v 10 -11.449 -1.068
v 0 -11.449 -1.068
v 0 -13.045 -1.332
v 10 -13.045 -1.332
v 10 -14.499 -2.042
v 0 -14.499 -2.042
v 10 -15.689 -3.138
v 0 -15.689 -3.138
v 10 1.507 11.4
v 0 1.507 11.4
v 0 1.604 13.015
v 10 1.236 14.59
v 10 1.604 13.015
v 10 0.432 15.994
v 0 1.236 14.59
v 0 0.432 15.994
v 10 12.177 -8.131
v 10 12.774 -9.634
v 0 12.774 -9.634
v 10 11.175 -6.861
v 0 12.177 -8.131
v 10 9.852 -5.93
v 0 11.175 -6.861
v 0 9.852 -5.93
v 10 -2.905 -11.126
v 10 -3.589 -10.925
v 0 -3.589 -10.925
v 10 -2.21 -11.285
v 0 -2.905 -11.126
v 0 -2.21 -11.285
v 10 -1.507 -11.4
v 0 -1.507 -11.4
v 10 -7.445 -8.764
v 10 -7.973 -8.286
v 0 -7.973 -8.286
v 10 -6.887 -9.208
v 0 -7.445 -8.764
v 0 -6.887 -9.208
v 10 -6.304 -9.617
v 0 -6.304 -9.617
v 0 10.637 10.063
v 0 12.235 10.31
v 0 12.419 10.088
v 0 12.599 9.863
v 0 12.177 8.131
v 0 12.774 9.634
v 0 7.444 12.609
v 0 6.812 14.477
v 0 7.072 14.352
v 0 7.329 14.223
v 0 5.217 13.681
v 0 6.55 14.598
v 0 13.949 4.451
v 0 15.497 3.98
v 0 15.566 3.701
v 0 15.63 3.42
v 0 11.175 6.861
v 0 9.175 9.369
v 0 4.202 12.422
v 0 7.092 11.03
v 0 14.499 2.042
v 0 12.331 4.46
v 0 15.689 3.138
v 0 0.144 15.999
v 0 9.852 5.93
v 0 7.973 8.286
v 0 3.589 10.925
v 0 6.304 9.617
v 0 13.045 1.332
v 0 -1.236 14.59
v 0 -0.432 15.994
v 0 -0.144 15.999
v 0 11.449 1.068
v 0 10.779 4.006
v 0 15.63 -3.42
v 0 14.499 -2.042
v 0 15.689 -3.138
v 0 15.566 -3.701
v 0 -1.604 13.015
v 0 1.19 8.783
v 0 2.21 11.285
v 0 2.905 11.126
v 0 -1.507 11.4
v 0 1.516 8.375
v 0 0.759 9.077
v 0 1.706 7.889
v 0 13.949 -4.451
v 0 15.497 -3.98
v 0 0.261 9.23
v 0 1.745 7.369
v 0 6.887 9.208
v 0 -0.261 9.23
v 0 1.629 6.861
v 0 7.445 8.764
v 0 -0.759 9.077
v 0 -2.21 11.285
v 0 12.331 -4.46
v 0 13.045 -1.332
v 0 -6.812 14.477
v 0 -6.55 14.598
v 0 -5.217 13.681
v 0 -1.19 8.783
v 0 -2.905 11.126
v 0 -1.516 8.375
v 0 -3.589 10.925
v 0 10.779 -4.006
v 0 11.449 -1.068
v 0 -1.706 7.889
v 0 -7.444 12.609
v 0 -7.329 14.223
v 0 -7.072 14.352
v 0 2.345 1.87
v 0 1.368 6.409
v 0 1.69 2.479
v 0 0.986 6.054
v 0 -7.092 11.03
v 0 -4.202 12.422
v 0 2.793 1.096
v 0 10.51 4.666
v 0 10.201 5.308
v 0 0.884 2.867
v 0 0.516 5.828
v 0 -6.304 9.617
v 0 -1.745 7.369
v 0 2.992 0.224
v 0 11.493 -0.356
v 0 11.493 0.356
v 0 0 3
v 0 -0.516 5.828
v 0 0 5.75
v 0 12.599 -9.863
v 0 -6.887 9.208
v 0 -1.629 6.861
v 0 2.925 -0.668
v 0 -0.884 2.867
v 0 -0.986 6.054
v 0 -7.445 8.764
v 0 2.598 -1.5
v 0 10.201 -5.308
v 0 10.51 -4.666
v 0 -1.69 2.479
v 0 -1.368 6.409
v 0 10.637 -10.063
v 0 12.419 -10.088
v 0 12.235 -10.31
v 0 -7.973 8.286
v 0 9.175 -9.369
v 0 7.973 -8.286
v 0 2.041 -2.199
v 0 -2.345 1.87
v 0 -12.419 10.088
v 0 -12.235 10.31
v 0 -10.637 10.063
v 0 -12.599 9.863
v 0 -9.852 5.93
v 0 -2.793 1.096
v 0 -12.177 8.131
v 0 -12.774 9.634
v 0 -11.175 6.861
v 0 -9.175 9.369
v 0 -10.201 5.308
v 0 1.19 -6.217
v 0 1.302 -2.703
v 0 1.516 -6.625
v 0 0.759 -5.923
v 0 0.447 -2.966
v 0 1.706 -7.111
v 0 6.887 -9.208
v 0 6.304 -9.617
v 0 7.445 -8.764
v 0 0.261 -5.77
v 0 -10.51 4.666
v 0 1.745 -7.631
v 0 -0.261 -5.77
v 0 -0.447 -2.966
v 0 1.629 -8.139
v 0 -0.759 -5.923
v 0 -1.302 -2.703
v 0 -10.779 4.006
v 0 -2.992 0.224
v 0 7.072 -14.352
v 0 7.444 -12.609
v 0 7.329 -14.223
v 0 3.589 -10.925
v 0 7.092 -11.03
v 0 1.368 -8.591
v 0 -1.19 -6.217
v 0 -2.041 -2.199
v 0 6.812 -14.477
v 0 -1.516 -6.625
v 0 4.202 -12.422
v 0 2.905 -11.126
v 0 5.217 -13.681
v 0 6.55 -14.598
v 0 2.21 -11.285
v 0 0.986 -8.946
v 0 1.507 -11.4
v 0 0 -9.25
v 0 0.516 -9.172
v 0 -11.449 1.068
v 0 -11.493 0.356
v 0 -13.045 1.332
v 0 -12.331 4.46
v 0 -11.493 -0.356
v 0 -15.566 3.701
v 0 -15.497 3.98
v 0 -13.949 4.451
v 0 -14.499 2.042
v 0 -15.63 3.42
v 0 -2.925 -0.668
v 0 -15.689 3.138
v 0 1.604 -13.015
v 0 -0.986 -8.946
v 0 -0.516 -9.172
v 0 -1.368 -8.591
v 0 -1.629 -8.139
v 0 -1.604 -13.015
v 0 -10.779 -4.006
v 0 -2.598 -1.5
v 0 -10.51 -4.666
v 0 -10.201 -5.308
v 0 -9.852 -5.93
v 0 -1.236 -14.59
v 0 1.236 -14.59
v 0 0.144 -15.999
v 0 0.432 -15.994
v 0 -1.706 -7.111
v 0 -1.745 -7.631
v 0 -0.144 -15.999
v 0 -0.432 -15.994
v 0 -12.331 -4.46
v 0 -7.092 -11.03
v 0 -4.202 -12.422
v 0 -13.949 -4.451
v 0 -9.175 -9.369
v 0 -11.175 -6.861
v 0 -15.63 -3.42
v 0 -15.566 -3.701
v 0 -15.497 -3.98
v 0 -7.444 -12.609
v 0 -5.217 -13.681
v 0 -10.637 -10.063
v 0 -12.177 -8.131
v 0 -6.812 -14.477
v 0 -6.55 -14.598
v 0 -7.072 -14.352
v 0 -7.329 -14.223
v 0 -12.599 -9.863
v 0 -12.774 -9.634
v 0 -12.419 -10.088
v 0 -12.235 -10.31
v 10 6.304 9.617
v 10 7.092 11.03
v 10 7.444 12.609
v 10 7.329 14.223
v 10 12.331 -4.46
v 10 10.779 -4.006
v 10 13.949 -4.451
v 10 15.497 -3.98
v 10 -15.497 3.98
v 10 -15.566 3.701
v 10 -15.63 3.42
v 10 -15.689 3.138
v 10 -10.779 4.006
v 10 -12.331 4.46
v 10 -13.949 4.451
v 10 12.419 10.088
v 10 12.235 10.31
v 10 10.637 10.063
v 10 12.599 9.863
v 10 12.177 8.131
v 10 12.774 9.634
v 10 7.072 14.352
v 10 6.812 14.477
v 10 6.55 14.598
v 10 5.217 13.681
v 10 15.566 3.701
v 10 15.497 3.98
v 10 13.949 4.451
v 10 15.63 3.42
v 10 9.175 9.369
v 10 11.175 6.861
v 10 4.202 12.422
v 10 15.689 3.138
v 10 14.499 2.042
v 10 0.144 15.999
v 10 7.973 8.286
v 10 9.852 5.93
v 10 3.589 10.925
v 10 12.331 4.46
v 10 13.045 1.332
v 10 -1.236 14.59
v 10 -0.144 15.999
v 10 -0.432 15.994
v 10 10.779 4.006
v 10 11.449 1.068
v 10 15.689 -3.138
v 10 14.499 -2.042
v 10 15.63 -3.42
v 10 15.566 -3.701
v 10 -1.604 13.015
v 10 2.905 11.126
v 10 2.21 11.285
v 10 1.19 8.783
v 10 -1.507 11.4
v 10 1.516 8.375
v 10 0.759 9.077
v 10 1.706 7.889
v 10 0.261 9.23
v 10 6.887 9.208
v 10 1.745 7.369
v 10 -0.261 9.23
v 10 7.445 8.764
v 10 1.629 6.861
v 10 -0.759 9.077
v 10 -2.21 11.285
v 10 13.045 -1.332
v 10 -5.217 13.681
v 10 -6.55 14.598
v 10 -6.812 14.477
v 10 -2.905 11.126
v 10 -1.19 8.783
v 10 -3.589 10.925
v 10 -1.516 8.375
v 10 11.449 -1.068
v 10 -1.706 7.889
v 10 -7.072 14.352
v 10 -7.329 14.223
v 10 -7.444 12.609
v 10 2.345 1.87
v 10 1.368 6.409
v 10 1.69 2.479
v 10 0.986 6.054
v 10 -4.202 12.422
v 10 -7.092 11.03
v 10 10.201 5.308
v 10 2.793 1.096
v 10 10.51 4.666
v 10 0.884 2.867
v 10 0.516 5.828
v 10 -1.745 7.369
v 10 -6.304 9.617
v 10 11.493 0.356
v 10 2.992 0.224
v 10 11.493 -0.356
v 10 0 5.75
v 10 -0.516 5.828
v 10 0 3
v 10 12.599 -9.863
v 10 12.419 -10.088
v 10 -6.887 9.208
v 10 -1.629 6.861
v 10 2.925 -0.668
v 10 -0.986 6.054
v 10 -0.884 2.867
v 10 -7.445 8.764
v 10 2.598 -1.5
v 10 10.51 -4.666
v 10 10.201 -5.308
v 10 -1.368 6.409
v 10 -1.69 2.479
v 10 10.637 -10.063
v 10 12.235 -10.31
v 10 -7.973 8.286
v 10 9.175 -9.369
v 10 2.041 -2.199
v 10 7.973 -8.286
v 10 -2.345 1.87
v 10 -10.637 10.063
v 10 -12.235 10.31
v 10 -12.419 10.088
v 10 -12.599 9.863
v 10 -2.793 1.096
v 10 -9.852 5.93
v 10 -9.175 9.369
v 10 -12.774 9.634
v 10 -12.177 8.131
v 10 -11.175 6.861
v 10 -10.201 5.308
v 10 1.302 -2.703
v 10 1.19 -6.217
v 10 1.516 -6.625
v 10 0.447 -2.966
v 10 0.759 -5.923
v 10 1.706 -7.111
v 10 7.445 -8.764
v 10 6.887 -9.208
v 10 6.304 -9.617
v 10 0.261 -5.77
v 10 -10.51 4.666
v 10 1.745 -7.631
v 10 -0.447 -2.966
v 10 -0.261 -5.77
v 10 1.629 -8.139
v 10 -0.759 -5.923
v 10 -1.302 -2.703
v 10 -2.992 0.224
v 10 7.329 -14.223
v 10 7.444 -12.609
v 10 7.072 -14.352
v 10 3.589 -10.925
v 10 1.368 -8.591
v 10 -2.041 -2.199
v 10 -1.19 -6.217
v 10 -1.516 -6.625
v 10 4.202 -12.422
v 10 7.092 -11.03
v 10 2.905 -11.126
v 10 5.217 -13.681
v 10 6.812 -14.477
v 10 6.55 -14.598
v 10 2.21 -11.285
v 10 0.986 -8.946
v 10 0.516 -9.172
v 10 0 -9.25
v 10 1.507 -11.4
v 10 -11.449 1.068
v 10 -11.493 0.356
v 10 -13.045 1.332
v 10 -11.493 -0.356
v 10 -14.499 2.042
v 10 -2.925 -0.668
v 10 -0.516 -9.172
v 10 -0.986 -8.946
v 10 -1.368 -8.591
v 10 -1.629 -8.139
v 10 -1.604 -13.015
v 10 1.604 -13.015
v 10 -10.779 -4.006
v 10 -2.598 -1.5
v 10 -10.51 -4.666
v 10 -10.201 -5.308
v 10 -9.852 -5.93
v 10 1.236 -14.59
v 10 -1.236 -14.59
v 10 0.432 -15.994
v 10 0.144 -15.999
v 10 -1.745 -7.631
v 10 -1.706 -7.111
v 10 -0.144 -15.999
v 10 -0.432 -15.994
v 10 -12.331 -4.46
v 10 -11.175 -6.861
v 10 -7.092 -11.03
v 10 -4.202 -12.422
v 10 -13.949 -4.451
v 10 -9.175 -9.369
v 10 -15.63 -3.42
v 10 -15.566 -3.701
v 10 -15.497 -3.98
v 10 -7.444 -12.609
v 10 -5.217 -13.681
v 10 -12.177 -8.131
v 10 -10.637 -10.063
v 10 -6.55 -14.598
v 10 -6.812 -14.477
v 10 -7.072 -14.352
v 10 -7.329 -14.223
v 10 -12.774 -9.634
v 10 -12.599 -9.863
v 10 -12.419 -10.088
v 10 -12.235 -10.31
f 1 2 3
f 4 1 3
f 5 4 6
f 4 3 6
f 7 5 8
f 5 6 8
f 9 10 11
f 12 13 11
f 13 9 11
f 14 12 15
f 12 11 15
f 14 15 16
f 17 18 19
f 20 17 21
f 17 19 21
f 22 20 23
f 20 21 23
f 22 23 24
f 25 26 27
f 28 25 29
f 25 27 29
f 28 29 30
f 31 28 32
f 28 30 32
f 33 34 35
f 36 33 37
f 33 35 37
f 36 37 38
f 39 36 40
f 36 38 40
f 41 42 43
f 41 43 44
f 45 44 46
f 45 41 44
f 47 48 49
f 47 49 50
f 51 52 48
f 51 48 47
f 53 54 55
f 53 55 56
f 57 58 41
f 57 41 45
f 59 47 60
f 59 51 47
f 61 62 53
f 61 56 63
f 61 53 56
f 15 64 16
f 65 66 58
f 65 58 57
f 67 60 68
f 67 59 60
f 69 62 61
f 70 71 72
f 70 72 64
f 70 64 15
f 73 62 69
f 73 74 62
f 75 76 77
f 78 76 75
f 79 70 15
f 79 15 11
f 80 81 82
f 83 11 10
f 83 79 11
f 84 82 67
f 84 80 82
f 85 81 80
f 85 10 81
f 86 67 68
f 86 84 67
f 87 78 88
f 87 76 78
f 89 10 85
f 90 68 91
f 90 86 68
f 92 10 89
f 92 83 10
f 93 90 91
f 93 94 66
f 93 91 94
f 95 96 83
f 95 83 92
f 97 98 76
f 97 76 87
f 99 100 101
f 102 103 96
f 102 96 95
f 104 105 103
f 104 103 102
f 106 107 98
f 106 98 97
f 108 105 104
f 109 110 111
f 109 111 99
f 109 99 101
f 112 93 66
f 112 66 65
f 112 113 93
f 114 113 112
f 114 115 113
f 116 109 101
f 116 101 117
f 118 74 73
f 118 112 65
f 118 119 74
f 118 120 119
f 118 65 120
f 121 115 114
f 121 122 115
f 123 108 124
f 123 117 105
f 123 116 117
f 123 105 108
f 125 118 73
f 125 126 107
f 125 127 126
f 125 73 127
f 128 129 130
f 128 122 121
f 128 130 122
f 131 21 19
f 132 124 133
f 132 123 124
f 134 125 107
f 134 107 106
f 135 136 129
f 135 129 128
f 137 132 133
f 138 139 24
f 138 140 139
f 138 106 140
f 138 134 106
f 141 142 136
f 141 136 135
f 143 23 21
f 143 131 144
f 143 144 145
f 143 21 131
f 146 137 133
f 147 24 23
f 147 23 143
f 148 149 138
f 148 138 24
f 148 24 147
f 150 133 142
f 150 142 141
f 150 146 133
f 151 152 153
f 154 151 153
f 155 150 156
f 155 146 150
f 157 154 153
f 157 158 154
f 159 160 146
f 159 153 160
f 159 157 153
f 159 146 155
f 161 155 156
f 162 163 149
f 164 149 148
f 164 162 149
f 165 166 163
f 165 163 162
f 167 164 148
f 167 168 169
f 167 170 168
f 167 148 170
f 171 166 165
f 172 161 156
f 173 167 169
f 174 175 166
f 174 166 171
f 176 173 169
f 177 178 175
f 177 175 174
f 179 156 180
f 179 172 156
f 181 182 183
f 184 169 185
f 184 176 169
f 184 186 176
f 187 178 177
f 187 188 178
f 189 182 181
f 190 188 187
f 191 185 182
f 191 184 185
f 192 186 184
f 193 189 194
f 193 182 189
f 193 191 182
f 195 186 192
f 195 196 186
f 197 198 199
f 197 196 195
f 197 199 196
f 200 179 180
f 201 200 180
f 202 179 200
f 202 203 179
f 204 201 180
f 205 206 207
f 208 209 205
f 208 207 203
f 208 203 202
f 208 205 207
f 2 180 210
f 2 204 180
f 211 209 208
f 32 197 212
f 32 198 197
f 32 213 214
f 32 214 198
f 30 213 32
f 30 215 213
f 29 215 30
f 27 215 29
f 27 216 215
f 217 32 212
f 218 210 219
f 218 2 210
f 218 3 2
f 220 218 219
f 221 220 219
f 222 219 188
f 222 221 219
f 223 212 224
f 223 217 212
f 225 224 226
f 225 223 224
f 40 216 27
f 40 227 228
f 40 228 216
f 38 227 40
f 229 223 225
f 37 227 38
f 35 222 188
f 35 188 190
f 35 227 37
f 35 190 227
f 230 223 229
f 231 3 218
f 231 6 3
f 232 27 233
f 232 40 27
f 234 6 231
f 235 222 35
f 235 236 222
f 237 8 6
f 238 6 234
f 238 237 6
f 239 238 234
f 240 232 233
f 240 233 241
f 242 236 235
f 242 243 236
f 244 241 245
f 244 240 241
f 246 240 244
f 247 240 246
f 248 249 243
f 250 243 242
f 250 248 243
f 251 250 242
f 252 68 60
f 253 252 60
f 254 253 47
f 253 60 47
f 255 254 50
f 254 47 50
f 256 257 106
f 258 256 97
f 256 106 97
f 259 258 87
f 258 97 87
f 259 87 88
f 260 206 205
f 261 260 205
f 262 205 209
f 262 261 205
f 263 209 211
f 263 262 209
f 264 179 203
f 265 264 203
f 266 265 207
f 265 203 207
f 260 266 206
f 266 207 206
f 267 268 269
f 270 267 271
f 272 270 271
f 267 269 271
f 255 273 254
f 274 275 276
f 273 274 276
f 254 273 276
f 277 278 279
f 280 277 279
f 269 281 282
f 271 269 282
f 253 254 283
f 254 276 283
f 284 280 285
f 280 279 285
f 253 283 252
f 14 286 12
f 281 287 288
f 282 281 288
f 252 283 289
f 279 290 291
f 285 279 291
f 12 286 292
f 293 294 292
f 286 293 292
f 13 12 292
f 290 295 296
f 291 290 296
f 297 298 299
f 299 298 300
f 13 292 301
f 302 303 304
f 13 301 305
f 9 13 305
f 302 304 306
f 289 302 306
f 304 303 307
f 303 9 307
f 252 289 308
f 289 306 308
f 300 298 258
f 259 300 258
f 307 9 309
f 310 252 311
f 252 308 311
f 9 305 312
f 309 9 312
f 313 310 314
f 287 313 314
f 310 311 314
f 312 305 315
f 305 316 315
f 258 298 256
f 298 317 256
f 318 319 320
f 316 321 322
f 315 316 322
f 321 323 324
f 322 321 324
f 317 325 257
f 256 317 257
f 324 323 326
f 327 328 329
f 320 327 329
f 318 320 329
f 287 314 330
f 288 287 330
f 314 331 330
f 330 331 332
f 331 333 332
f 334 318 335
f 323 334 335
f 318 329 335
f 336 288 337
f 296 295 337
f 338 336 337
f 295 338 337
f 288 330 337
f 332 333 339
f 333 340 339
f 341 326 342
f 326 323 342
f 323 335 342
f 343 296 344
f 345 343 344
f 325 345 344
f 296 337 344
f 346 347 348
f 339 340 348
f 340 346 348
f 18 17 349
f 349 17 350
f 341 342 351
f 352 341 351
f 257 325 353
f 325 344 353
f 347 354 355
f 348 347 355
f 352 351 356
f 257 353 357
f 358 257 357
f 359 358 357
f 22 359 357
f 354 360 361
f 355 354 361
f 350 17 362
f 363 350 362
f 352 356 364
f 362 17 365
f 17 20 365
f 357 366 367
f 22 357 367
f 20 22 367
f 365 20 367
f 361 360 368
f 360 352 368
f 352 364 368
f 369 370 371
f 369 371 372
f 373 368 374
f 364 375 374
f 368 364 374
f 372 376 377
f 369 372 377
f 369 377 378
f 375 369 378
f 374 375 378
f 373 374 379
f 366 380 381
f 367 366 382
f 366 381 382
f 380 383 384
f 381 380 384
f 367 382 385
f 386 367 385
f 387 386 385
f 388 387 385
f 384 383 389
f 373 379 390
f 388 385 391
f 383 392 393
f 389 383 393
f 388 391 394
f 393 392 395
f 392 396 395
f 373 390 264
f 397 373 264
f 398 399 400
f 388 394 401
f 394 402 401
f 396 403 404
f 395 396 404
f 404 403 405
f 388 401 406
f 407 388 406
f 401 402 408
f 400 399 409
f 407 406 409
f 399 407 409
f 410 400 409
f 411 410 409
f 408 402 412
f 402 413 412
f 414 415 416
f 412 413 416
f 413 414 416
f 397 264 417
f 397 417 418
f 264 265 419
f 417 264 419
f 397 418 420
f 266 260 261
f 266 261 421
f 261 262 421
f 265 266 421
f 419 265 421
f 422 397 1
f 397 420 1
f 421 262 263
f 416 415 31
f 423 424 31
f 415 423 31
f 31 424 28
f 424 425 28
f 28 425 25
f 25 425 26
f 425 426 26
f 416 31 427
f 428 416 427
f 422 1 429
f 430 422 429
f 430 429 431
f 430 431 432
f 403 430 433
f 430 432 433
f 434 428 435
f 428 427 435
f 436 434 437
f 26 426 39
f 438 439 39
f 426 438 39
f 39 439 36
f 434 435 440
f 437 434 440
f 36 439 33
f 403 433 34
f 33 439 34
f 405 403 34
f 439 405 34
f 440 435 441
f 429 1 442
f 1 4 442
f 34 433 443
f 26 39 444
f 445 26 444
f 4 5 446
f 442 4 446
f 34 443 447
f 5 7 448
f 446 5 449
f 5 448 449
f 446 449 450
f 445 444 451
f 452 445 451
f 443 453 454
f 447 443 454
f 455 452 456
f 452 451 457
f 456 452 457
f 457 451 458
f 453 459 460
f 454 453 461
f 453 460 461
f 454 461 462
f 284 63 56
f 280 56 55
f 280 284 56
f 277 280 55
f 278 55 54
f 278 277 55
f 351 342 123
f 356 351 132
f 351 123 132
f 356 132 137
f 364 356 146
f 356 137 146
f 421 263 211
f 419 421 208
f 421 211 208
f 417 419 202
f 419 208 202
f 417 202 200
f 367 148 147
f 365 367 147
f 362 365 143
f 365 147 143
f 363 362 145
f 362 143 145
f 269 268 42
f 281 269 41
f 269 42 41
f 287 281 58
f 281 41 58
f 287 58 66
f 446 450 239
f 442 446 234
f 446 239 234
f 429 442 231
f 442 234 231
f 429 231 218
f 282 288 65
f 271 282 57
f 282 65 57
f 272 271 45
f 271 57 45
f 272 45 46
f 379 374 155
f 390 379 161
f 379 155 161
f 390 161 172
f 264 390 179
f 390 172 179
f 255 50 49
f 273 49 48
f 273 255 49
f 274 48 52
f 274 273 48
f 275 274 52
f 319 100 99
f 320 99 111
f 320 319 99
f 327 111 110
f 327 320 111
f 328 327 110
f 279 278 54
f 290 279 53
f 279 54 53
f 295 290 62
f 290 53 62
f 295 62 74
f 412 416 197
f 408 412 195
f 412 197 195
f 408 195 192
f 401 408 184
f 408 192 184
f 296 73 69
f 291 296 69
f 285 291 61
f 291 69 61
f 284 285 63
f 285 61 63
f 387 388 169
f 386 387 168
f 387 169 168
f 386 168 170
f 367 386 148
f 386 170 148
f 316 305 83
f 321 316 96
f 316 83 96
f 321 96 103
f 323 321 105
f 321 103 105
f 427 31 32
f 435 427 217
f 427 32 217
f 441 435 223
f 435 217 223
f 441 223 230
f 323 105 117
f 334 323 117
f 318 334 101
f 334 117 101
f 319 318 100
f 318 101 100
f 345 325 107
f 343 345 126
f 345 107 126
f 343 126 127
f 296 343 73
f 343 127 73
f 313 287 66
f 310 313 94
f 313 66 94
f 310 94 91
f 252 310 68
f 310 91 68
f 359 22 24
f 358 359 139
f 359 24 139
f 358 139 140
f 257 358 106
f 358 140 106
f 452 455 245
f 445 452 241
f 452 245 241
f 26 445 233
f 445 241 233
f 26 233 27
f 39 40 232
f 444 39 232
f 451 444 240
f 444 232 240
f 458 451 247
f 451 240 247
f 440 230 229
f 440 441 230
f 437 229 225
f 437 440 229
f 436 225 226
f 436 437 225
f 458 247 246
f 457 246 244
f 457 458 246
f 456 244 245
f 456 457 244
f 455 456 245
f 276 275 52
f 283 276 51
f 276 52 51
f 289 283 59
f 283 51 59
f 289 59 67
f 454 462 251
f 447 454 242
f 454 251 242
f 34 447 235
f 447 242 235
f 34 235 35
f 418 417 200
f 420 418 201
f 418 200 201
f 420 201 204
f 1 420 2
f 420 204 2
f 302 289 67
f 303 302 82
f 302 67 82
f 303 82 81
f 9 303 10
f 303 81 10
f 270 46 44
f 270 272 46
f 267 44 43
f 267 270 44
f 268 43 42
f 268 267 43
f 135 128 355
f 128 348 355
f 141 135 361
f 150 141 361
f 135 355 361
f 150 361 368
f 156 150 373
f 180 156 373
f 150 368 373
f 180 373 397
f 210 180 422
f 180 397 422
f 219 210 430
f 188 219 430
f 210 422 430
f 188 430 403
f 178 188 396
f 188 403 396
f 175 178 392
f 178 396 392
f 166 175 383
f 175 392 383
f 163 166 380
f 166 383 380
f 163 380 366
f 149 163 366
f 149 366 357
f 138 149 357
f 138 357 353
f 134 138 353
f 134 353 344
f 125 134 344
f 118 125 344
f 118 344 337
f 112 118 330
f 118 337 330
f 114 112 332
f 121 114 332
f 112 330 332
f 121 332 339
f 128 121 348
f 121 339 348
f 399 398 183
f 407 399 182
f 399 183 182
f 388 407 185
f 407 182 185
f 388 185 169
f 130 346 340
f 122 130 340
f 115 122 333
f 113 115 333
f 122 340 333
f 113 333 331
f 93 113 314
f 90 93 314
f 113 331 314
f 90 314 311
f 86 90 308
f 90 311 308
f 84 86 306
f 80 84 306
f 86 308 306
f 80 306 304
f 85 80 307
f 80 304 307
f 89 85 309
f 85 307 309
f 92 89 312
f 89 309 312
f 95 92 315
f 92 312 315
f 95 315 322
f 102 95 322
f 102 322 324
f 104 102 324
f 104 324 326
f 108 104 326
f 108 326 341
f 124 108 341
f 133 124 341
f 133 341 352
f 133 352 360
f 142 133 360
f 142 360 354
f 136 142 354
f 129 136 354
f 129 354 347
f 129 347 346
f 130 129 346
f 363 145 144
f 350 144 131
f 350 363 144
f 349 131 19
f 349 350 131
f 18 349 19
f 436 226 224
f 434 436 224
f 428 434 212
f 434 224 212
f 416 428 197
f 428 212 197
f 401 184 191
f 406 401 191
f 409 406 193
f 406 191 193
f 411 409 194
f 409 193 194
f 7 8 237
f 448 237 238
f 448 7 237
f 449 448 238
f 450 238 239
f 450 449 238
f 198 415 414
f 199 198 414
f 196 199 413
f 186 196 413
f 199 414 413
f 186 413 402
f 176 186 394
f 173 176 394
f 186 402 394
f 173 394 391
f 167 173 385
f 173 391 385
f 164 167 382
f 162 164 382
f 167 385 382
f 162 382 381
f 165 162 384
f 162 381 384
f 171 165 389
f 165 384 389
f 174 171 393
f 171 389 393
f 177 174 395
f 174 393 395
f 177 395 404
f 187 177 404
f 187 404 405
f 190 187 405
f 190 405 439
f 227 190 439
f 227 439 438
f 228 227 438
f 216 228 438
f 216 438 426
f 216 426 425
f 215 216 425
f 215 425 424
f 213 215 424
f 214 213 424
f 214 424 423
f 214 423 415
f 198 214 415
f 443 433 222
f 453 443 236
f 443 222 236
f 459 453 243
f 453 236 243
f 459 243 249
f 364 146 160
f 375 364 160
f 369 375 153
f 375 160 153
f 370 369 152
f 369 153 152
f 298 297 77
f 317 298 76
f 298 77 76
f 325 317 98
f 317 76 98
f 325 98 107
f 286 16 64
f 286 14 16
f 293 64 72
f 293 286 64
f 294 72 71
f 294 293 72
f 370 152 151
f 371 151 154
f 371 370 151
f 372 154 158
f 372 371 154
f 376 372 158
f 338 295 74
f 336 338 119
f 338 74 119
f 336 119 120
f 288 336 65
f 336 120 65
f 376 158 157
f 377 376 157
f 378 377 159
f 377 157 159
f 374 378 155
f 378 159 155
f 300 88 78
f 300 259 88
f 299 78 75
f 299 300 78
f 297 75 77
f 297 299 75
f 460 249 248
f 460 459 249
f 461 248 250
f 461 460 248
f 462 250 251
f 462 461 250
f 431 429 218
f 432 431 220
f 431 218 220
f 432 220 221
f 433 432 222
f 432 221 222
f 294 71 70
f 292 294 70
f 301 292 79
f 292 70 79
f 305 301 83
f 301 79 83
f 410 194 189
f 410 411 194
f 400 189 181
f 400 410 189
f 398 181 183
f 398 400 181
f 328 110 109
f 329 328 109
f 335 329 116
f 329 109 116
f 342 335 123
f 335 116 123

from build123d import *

# Parameters (mm, degrees)
BASPROSKE_W        = 10
BASPROSKE_H        = 16
TOOTHCUT_DEPTH     = 25.738633754
TEETHCUTS_COUNT    = 14
TEETHCUTS_ANGLE    = 334.285714286
BORSKE_R           = 3
BORE_DEPTH         = 50.0000508
HOLE_WIZARD_M3_1_D = 3.5


with BuildPart() as part:
    # BasProSke → Base-Revolve (revolve)
    with BuildSketch(Plane(origin=(0, 0, 0), x_dir=(1, 0, 0), z_dir=(0, 1, 0)), mode=Mode.PRIVATE) as base_revolve_sk:
        with Locations((5, 8)):
            Rectangle(BASPROSKE_W, BASPROSKE_H)
    revolve(base_revolve_sk.sketch.rotate(Axis((-10, 0, 0), (1, 0, 0)), 180), axis=Axis((-10, 0, 0), (1, 0, 0)))

    # TooCutSke → ToothCut (cut, through all)
    with BuildSketch(Plane(origin=(0, 0, 0), x_dir=(0, 0, -1), z_dir=(1, 0, 0))):
        with BuildLine():
            ThreePointArc((1.067858192, 11.449309144), (0, 11.499), (-1.067858192, 11.449309144))
            ThreePointArc((-1.067858192, 11.449309144), (-1.641684211, 13.812780716), (-3.163375005, 15.710076503))
            ThreePointArc((-3.163375005, 15.710076503), (0, 16.0254), (3.163375005, 15.710076503))
            ThreePointArc((3.163375005, 15.710076503), (1.641684211, 13.812780716), (1.067858192, 11.449309144))
        make_face()
    toothcut = extrude(amount=TOOTHCUT_DEPTH, mode=Mode.SUBTRACT)

    # TeethCuts: ToothCut ×14 about axis
    teethcuts_axis = Axis((-10, 0, 0), (1, 0, 0))
    for i in range(1, TEETHCUTS_COUNT):
        add(toothcut.rotate(teethcuts_axis, i * TEETHCUTS_ANGLE / (TEETHCUTS_COUNT - 1)), mode=Mode.SUBTRACT)

    # BorSke → Bore (cut, symmetric)
    with BuildSketch(Plane(origin=(0, 0, 0), x_dir=(0, 0, -1), z_dir=(1, 0, 0))):
        with Locations(Location((0, 0, 0), (0, 0, 180))):
            Circle(BORSKE_R)
    extrude(amount=BORE_DEPTH, both=True, mode=Mode.SUBTRACT)

    # M3 すきま穴1 (through all)
    with Locations(Plane.ZY):
        with Locations((7.5, 0), (-7.5, 0)):
            Hole(HOLE_WIZARD_M3_1_D / 2)


solid = part.part
